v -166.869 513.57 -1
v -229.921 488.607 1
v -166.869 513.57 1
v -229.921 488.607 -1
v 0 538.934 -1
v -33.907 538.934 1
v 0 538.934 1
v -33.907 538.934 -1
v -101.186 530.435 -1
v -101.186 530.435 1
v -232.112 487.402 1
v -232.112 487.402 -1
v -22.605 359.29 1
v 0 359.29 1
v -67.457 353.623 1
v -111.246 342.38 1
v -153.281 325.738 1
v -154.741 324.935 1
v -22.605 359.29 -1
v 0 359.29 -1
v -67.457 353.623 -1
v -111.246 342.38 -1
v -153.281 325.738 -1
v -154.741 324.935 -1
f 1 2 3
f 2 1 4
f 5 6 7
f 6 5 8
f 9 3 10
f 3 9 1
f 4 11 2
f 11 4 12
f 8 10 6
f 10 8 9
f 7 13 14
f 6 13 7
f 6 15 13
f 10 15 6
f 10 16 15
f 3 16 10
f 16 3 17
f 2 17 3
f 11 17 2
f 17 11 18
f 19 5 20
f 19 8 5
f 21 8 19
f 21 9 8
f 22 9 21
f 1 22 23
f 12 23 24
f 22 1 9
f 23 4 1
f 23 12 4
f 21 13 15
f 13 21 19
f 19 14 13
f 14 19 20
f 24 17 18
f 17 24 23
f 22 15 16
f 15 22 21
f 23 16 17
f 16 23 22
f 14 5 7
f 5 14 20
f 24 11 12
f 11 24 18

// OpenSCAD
WristArc=160;
ElbowArc=260;
Length=180;


//hidden---------------
Wrist2orig=(WristArc*Length)/(ElbowArc-Length);
Elbow2orig=Wrist2orig+Length;
Angle=(WristArc/Wrist2orig)*(180/3.14159);

difference(){
union(){
difference(){
cylinder(r=Elbow2orig,h=2,center=true, $fn=50);
cylinder(r=Wrist2orig,h=3,center=true, $fn=50);
}
}
	
union(){
	translate([Elbow2orig,0,0])
		cube([Elbow2orig*2,Elbow2orig*2+5,4],center=true);


	rotate([0,0,Angle])
		translate([-Elbow2orig,0,0])
			cube([Elbow2orig*2,Elbow2orig*2+5,5],center=true);
}
}
